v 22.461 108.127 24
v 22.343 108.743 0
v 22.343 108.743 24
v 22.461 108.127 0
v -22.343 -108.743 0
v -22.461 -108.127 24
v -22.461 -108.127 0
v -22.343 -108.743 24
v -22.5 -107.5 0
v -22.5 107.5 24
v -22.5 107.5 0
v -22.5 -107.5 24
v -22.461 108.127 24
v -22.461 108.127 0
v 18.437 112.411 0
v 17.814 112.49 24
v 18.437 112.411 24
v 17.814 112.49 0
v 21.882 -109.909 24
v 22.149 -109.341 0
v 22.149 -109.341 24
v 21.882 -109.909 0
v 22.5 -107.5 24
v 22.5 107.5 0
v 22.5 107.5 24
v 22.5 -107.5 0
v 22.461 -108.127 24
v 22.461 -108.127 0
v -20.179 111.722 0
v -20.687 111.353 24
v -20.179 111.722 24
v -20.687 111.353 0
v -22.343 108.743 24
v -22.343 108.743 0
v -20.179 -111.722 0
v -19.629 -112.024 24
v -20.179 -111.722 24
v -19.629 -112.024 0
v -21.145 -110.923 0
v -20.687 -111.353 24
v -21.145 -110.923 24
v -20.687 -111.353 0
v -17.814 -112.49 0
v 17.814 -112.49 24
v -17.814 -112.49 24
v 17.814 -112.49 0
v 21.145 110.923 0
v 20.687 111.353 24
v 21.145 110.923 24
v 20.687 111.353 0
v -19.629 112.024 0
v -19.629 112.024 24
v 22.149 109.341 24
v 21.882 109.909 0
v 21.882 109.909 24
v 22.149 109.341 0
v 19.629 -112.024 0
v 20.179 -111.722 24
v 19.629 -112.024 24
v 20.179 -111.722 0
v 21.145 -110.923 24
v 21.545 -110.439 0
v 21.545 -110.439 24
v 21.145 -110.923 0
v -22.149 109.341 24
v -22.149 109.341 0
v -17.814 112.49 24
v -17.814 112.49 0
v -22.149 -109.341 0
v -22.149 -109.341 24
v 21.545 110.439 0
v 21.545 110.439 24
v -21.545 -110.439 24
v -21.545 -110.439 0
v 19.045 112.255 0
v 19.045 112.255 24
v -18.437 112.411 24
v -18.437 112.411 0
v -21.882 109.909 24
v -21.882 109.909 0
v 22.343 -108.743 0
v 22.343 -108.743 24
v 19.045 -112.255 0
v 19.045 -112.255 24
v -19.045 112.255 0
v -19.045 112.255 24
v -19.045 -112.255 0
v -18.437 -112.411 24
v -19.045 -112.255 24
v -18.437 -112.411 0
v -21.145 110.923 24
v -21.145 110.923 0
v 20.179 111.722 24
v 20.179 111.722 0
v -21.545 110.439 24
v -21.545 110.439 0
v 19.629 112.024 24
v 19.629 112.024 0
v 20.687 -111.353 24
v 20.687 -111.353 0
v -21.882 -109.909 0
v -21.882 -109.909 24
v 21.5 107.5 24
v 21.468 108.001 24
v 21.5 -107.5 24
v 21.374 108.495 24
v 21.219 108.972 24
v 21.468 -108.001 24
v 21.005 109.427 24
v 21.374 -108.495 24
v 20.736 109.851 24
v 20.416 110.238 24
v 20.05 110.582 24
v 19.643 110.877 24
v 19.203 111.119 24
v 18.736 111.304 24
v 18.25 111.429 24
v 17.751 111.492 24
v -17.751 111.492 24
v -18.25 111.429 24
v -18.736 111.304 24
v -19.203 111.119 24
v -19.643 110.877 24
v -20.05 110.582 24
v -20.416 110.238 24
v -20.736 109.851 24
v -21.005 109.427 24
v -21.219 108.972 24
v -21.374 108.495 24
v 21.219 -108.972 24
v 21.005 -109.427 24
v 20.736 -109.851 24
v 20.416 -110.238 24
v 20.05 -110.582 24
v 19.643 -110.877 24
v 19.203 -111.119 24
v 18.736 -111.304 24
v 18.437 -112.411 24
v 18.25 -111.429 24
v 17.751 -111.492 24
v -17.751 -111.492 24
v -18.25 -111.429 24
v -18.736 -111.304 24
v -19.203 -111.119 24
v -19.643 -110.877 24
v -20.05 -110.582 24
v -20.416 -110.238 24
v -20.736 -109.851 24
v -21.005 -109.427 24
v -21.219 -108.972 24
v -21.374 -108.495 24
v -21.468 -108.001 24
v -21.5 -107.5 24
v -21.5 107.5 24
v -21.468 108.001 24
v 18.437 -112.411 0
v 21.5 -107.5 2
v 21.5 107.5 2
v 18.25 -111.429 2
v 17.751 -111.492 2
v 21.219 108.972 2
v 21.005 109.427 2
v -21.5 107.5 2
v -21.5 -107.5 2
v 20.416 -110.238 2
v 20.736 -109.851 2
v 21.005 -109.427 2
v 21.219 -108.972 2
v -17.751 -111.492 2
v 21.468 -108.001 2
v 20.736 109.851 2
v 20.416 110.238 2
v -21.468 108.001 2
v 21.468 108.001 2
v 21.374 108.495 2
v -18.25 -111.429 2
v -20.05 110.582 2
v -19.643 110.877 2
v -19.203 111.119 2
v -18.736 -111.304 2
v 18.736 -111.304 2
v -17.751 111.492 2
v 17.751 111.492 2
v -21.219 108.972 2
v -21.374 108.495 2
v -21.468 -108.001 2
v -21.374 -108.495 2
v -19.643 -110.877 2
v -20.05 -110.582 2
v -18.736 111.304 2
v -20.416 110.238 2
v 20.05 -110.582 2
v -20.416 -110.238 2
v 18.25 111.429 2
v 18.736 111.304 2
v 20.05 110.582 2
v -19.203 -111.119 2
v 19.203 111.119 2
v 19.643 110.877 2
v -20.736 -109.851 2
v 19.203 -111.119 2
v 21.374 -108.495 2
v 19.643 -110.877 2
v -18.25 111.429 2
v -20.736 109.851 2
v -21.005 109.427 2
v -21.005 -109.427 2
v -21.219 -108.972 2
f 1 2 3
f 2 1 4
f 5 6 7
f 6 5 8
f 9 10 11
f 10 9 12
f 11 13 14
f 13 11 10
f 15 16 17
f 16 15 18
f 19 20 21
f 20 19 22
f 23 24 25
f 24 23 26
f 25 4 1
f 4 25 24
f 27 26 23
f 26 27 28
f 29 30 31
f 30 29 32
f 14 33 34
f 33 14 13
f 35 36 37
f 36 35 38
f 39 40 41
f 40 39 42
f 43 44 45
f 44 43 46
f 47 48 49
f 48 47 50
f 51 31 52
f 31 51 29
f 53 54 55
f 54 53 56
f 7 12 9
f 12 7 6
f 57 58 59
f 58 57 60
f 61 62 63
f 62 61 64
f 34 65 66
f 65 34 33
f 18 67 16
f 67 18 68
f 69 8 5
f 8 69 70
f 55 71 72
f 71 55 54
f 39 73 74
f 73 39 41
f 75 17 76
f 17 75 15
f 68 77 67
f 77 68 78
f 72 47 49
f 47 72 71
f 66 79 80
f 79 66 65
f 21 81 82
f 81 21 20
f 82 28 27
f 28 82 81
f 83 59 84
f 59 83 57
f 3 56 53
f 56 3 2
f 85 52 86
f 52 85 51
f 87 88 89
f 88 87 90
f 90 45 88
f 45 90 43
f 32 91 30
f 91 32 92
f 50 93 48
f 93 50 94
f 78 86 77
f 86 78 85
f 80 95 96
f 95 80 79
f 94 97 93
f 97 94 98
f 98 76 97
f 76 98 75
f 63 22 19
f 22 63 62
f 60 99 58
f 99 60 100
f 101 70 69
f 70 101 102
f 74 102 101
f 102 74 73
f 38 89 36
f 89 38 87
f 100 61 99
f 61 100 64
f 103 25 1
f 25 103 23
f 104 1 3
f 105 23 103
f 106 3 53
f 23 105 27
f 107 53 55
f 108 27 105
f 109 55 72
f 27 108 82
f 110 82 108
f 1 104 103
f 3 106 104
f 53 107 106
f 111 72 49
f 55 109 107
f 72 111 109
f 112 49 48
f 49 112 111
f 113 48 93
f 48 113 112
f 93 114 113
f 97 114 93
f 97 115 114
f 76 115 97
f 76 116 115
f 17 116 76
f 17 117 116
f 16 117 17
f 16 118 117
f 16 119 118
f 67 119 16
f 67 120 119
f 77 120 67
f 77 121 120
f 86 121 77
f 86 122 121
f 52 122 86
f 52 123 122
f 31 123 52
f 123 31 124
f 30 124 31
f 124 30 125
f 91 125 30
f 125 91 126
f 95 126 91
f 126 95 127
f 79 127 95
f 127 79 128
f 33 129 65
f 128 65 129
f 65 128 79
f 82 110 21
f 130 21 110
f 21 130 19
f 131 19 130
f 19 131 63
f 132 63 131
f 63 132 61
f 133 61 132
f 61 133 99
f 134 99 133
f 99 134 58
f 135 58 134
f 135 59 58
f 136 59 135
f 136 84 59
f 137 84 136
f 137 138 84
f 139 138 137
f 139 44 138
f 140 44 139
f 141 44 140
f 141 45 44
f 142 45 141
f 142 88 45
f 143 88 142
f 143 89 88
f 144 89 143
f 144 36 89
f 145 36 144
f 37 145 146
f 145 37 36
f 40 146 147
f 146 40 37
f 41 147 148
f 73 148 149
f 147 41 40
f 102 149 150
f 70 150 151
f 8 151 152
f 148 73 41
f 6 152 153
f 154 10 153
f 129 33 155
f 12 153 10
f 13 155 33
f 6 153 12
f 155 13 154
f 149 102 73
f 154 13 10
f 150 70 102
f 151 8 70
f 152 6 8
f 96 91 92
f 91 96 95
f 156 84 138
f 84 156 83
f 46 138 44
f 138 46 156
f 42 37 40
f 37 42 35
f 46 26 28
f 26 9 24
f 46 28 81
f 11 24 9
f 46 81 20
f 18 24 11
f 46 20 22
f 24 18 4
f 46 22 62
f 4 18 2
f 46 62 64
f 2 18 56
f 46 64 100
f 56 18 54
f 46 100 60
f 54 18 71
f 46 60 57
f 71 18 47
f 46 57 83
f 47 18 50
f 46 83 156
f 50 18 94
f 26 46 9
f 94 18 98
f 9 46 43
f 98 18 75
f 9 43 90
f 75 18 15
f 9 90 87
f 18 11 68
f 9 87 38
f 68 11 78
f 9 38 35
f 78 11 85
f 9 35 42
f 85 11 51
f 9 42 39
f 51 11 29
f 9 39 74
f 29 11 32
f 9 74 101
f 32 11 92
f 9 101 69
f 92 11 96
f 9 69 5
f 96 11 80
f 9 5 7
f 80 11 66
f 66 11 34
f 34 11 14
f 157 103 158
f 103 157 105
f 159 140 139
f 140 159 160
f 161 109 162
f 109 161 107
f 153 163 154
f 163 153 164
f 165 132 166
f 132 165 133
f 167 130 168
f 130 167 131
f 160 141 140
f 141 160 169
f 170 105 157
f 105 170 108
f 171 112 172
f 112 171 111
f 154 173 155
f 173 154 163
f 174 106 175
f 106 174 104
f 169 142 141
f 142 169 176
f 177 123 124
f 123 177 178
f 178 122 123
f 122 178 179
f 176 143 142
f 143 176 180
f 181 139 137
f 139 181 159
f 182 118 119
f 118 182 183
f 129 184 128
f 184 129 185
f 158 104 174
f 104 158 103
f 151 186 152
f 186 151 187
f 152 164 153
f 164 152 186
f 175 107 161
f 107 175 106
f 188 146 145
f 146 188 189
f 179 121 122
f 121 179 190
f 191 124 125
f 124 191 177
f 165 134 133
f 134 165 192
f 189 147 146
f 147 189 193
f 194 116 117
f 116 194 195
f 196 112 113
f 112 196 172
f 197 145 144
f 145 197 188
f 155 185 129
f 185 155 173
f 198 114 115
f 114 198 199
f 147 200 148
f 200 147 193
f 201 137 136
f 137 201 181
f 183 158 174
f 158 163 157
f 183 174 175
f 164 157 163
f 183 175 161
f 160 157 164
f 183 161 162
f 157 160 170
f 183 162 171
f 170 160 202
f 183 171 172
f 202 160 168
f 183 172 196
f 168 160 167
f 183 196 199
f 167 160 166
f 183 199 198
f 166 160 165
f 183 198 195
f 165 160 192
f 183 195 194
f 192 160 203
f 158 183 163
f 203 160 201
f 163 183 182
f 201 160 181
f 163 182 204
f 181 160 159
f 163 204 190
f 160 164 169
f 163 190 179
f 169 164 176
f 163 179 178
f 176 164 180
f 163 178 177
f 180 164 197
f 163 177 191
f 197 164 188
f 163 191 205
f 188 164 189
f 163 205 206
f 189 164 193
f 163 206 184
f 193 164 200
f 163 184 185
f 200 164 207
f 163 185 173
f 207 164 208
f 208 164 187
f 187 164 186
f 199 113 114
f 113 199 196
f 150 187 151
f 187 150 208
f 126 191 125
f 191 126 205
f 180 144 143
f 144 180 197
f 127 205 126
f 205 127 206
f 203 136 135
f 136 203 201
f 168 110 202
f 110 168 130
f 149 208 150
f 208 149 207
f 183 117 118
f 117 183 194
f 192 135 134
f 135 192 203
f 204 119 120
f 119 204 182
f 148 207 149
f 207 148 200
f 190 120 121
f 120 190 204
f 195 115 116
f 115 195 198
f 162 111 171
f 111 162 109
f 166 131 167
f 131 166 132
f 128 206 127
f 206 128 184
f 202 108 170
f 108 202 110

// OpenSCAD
$fn = 50;


difference() {
	union() {
		hull() {
			translate(v = [-17.5000000000, 107.5000000000, 0]) {
				cylinder(h = 24, r = 5);
			}
			translate(v = [17.5000000000, 107.5000000000, 0]) {
				cylinder(h = 24, r = 5);
			}
			translate(v = [-17.5000000000, -107.5000000000, 0]) {
				cylinder(h = 24, r = 5);
			}
			translate(v = [17.5000000000, -107.5000000000, 0]) {
				cylinder(h = 24, r = 5);
			}
		}
	}
	union() {
		translate(v = [0, 0, 2]) {
			hull() {
				translate(v = [-17.5000000000, 107.5000000000, 0]) {
					cylinder(h = 22, r = 4);
				}
				translate(v = [17.5000000000, 107.5000000000, 0]) {
					cylinder(h = 22, r = 4);
				}
				translate(v = [-17.5000000000, -107.5000000000, 0]) {
					cylinder(h = 22, r = 4);
				}
				translate(v = [17.5000000000, -107.5000000000, 0]) {
					cylinder(h = 22, r = 4);
				}
			}
		}
	}
}
